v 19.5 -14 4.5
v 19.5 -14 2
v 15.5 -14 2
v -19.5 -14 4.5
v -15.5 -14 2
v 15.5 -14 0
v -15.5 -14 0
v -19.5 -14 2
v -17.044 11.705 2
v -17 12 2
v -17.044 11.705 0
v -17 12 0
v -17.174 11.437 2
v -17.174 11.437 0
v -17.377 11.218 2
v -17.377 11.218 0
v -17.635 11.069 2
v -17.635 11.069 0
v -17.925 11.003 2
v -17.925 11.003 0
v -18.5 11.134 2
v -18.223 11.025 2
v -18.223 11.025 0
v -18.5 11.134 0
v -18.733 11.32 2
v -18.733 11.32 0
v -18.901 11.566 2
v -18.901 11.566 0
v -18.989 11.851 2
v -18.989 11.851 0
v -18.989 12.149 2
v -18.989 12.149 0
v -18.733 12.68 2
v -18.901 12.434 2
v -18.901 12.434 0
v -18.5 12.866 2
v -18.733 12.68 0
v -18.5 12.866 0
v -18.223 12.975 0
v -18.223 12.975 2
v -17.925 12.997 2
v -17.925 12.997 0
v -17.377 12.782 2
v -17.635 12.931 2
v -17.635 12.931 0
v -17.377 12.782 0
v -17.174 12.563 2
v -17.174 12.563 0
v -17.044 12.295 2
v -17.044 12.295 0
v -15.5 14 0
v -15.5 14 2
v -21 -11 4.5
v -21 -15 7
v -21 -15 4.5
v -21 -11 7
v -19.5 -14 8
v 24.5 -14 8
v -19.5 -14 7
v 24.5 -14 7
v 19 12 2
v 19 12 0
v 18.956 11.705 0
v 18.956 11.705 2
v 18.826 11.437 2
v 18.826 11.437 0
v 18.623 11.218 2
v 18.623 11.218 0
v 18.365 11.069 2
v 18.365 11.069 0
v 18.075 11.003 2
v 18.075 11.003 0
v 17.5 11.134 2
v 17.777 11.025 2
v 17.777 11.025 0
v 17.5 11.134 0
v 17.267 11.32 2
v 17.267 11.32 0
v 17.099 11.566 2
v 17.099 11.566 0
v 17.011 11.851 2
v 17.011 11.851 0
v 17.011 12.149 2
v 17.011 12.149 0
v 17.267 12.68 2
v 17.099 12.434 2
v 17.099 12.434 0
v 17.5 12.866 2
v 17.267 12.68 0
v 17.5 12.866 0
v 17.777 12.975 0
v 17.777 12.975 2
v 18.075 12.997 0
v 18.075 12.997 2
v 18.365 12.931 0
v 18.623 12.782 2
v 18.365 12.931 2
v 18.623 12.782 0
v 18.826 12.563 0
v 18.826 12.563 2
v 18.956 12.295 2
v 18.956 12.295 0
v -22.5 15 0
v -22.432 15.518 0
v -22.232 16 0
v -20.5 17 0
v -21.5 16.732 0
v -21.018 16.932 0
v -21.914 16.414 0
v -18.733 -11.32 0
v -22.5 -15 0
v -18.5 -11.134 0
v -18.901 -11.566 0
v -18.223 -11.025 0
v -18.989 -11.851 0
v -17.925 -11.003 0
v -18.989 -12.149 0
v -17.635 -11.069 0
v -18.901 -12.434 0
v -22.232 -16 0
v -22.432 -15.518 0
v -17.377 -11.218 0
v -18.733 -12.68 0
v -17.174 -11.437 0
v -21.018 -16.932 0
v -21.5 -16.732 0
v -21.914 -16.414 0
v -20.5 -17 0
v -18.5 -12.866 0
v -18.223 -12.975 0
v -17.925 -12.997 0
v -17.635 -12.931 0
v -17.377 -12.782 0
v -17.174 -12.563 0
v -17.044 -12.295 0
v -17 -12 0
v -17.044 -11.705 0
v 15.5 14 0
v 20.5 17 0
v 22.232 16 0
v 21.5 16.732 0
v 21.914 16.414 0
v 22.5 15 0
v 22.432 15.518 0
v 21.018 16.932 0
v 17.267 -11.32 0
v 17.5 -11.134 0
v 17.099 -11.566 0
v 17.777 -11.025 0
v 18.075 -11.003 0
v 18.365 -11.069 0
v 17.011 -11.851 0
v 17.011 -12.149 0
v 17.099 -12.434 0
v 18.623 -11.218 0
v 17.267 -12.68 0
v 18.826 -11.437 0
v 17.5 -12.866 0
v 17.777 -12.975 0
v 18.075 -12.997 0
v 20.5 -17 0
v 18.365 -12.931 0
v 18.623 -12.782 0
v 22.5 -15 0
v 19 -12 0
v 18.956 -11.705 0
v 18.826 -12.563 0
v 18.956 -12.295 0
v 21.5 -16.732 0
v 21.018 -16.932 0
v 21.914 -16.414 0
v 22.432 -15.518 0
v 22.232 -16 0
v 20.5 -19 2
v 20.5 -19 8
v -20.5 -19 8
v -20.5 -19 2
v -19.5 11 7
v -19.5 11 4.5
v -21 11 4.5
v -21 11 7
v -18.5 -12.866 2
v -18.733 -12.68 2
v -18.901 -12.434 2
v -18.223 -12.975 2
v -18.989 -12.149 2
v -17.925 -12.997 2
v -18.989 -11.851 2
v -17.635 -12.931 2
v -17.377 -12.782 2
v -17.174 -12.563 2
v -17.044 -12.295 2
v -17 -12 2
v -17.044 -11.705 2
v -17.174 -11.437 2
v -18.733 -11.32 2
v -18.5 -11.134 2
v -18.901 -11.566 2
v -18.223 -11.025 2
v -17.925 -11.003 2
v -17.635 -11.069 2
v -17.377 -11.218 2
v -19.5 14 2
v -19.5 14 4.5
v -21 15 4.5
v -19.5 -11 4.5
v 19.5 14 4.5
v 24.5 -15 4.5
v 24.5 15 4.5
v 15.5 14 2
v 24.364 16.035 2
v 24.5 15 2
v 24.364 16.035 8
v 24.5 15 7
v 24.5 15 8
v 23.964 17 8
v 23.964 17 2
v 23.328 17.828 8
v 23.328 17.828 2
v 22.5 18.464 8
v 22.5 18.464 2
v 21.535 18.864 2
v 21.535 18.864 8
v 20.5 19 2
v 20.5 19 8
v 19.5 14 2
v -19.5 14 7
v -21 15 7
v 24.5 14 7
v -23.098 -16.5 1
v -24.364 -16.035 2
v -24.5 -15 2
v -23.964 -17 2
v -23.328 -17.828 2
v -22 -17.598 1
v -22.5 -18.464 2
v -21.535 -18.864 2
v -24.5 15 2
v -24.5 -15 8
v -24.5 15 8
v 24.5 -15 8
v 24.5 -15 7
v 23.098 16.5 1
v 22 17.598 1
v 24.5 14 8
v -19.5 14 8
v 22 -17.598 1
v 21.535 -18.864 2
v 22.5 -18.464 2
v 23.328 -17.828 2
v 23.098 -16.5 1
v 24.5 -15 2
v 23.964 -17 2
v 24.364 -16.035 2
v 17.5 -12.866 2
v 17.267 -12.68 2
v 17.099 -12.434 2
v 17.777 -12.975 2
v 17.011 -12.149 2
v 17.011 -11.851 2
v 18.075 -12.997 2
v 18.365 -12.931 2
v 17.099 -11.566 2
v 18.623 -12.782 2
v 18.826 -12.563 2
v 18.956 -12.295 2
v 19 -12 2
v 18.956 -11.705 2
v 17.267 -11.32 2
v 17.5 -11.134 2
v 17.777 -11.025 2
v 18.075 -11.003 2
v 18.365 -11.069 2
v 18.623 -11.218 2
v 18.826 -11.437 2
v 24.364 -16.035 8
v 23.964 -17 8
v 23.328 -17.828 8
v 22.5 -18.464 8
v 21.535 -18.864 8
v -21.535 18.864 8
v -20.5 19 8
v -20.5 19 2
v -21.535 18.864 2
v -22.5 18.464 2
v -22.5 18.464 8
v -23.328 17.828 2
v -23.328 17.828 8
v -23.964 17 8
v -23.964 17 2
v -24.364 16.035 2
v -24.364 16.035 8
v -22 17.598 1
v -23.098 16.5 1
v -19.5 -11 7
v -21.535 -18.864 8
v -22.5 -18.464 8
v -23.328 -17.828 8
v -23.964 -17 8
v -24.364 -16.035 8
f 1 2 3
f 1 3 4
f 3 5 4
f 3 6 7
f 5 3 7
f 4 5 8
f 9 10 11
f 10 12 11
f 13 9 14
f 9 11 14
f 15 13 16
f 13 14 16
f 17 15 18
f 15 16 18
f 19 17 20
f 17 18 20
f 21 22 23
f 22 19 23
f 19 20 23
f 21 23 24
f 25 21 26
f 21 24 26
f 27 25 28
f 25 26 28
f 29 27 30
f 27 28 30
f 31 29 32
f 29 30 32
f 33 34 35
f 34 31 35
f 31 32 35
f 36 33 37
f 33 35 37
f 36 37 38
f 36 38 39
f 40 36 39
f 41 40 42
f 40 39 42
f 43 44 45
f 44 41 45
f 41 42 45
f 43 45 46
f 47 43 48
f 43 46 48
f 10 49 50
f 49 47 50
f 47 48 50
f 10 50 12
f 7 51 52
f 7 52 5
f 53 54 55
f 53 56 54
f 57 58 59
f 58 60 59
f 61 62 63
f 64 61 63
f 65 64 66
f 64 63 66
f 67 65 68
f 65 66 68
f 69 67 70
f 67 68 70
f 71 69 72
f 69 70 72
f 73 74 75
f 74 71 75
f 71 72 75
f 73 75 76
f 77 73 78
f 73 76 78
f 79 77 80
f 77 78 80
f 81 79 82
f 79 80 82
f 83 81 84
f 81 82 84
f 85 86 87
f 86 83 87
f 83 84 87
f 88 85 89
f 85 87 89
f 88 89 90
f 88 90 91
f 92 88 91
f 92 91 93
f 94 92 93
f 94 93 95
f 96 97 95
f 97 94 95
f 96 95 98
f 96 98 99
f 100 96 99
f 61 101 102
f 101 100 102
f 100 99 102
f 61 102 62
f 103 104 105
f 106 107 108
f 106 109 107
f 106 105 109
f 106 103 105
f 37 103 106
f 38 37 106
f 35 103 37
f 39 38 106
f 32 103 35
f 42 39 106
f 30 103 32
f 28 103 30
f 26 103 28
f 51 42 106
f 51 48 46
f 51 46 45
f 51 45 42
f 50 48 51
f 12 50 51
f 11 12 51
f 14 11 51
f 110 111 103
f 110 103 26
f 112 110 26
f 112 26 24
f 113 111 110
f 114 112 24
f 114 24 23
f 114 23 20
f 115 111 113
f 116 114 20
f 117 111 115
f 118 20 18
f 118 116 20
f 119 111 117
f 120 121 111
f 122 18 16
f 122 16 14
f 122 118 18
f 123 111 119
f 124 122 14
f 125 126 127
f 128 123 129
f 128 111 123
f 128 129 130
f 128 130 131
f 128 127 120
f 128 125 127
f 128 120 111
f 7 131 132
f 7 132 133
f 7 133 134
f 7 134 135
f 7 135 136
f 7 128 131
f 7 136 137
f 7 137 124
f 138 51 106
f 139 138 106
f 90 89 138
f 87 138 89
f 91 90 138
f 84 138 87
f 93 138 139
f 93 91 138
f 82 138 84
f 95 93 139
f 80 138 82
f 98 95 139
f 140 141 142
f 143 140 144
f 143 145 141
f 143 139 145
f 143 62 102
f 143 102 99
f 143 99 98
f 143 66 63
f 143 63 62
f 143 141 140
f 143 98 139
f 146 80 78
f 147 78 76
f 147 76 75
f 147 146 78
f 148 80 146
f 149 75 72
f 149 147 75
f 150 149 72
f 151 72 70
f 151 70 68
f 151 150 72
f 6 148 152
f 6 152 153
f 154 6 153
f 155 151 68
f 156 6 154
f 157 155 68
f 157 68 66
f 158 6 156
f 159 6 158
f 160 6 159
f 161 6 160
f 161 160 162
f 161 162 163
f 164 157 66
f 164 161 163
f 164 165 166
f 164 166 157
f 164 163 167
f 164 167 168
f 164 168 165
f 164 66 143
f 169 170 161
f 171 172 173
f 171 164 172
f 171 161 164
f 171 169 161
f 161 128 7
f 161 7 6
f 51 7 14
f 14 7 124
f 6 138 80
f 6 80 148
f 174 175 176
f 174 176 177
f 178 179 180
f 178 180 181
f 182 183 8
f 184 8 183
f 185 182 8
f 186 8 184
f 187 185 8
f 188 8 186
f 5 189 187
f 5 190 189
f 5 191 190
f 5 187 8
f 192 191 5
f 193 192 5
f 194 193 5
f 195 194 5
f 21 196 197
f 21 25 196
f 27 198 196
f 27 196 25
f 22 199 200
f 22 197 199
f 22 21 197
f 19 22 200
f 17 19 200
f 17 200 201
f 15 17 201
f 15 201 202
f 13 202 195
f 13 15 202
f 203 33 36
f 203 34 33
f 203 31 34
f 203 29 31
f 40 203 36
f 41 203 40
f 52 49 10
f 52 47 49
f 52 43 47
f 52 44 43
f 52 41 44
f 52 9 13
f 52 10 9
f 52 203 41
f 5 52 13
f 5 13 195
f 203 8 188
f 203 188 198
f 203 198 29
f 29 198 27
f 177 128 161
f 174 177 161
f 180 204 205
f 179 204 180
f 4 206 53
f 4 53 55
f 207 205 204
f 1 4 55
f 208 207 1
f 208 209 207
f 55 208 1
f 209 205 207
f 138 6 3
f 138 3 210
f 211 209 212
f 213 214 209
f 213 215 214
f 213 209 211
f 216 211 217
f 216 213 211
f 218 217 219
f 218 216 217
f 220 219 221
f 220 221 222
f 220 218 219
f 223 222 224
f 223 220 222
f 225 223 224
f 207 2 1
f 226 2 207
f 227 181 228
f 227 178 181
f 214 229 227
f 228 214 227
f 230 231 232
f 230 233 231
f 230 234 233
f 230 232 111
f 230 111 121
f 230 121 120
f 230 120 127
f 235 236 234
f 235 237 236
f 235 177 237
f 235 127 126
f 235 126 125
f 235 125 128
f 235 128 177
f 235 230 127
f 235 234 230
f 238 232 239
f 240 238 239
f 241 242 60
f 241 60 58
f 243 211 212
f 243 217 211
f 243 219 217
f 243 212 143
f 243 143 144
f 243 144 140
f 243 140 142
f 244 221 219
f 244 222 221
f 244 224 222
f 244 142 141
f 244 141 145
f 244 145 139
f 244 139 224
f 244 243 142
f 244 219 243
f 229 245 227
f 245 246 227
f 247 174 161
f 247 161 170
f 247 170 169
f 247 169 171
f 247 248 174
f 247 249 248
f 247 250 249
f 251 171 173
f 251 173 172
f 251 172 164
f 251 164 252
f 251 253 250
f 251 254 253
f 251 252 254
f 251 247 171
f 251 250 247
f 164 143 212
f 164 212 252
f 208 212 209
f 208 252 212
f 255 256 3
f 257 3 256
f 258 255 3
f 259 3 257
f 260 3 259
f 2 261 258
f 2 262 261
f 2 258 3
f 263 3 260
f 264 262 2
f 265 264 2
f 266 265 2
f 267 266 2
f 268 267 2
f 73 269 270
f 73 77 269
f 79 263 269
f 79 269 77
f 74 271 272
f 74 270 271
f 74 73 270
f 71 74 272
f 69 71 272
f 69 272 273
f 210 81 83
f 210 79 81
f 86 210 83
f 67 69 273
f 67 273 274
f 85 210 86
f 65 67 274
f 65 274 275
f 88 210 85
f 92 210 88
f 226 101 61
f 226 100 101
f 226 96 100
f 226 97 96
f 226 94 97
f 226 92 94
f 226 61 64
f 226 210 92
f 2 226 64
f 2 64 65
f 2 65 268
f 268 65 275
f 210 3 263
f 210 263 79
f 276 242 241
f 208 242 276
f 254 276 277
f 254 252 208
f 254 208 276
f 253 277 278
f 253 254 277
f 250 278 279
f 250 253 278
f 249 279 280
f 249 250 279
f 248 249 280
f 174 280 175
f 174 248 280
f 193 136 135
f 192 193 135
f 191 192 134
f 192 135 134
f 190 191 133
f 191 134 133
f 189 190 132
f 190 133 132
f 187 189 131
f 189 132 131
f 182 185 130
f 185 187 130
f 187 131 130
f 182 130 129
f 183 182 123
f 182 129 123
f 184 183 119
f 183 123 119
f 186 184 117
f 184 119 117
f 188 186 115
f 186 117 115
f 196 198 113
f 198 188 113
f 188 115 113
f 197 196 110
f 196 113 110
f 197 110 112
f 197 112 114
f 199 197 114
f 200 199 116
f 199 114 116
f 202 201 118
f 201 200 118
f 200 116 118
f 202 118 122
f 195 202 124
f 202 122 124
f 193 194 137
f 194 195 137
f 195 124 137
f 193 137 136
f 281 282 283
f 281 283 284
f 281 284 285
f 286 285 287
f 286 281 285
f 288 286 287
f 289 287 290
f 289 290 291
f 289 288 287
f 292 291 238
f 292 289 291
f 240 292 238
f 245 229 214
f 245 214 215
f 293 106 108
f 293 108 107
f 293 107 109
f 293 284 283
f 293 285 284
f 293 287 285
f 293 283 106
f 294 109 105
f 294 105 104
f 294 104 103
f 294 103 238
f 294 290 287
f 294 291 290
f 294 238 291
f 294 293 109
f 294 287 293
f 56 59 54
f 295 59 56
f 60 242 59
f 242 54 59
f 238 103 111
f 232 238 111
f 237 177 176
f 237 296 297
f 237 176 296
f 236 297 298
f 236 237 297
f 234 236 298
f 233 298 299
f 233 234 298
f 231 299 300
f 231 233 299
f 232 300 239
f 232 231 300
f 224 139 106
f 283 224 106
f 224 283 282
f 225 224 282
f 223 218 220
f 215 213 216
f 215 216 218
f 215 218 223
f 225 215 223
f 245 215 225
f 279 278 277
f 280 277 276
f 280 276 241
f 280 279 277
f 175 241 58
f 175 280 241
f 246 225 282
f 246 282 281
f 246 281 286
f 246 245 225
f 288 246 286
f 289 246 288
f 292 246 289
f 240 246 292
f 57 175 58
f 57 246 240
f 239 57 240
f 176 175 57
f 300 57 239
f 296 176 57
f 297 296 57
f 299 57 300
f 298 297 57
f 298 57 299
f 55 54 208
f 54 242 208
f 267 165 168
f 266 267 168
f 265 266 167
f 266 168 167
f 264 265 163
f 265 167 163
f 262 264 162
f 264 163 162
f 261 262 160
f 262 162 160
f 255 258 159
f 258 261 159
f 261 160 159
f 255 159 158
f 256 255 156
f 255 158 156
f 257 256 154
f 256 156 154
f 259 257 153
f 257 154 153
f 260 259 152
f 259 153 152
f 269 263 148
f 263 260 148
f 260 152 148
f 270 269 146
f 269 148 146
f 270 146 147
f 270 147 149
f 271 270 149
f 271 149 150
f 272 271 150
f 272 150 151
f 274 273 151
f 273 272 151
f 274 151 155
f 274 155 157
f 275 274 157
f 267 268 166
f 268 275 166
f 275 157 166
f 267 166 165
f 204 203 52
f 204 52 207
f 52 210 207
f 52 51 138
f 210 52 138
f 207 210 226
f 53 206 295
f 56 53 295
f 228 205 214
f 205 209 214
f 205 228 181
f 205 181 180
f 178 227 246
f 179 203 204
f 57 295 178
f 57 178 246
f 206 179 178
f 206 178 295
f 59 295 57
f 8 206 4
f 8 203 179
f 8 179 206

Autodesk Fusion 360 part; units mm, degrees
sketch "Skizze1" plane through (0, 0, 0) normal (0, 0, 1) x (1, 0, 0)
  line L0 (19.5, 14) -> (-19.5, 14)
  line L1 (-19.5, 14) -> (-19.5, -14)
  line L2 (-19.5, -14) -> (19.5, -14)
  line L3 (19.5, -14) -> (19.5, 14)
  line L4 (19.5, 14) -> (-19.5, -14) construction
  line L5 (-19.5, 14) -> (19.5, -14) construction
  line L6 (22.5, 17) -> (-22.5, 17)
  line L7 (-22.5, 17) -> (-22.5, -17)
  line L8 (-22.5, -17) -> (22.5, -17)
  line L9 (22.5, -17) -> (22.5, 17)
  line L10 (22.5, 17) -> (-22.5, -17) construction
  line L11 (-22.5, 17) -> (22.5, -17) construction
  line L12 (15.5, 14) -> (-15.5, 14)
  line L13 (-15.5, 14) -> (-15.5, -14)
  line L14 (-15.5, -14) -> (15.5, -14)
  line L15 (15.5, -14) -> (15.5, 14)
  line L16 (15.5, 14) -> (-15.5, -14) construction
  line L17 (-15.5, 14) -> (15.5, -14) construction
  line L18 (-19.5, 14) -> (-18.5, 14)
  circle A0 centre (-18, 12) radius 1
  circle A1 centre (-18, -12) radius 1
  circle A2 centre (18, -12) radius 1
  circle A3 centre (18, 12) radius 1
  dimension "d1" = 39
  dimension "d2" = 28
  dimension "d3" = 45
  dimension "d4" = 34
  dimension "d5" = 31
  dimension "d7" = 2
  dimension "d8" = 2
  dimension "d9" = 2
  dimension "d10" = 2
extrude "Extrusion1" add sketch "Skizze1" along normal blind 6 contours L6 L7 L8 L9
extrude "Extrusion2" add sketch "Skizze1" along normal blind 2 contours L0 L2 L3 L15 | L0 L1 L2 L13 L18
extrude "Extrusion3" add 1 faces at (-6.5, -16, 6) along direction (0, 0, 1) blind 2
extrude "Extrusion4" add 1 faces at (-22.5, -5.6667, 5.3333) along direction (-1, 0, 0) blind 2
extrude "Extrusion5" add 1 faces at (22.5, -5.6667, 2.6667) along direction (1, 0, 0) blind 2
extrude "Extrusion6" add 1 faces at (-8.1667, -17, 5.3333) along direction (0, -1, 0) blind 2
extrude "Extrusion7" add 1 faces at (8.1667, 17, 5.3333) along direction (0, 1, 0) blind 2
fillet "Abrundung1" radius 4 1 edges at (24.5, 19, 4)
fillet "Abrundung2" radius 4 1 edges at (-24.5, 19, 4)
fillet "Abrundung3" radius 4 1 edges at (-24.5, -19, 4)
fillet "Abrundung4" radius 4 1 edges at (24.5, -19, 4)
chamfer "Fase1" distance 2 angle 45 8 edges at (24.5, 0, 0) (23.3284, -17.8284, 0) (0, -19, 0) (-23.3284, -17.8284, 0) (-24.5, 0, 0) (-23.3284, 17.8284, 0) (0, 19, 0) (23.3284, 17.8284, 0)
sketch "Skizze2" plane through (24.5, 0, 0) normal (1, 0, 0) x (0, 0, -1)
  line L0 (-2, -15) -> (-2, 15)
  line L1 (-2, 15) -> (-8, 15)
  line L2 (-8, 15) -> (-8, -15)
  line L3 (-8, -15) -> (-2, -15)
  line L4 (-7, 15) -> (-4.5, 15)
  line L5 (-4.5, 15) -> (-4.5, -15)
  line L6 (-4.5, -15) -> (-7, -15)
  line L7 (-7, -15) -> (-7, 15)
extrude "Extrusion8" cut sketch "Skizze2" against normal blind 44 contours L1 L3 L4 L5 L6 L7
sketch "Skizze3" plane through (0, 0, 0) normal (1, 0, 0) x (0, 0, -1)
  line L0 (-4.5, -14) -> (-2, -14)
  line L1 (-2, -14) -> (-2, 14)
  line L2 (-2, 14) -> (-4.5, 14)
  line L3 (-4.5, 14) -> (-4.5, 15)
  line L4 (-4.5, 15) -> (-7, 15)
  line L5 (-7, 15) -> (-7, 14)
  line L6 (-7, 14) -> (-8, 14)
  line L7 (-8, 14) -> (-8, -14)
  line L8 (-8, -14) -> (-7, -14)
  line L9 (-7, -14) -> (-7, -15)
  line L10 (-7, -15) -> (-4.5, -15)
  line L11 (-4.5, -15) -> (-4.5, -14)
  line L12 (-7, 15) -> (-4.5, 15)
  line L13 (-4.5, 15) -> (-4.5, 11)
  line L14 (-4.5, 11) -> (-7, 11)
  line L15 (-7, 11) -> (-7, 15)
  line L16 (-7, -15) -> (-4.5, -15)
  line L17 (-4.5, -15) -> (-4.5, -11)
  line L18 (-4.5, -11) -> (-7, -11)
  line L19 (-7, -11) -> (-7, -15)
  dimension "d37" = 4
  dimension "d38" = 2.5
  dimension "d39" = 4
  dimension "d40" = 2.5
extrude "Extrusion9" cut sketch "Skizze3" against normal blind 21 contours L9 L10 L11 L16 L17 L18 L19 | L3 L4 L5 L12 L13 L14 L15
sketch "Skizze4" plane through (19.5, 0, 0) normal (-1, 0, 0) x (0, 0, 1)
  line L0 (7, 14) -> (7, -14)
  line L1 (7, -14) -> (8, -14)
  line L2 (8, -14) -> (8, 14)
  line L3 (8, 14) -> (7, 14)
  line L4 (7, 14) -> (8, 14)
  line L5 (8, 14) -> (8, -14)
  line L6 (8, -14) -> (7, -14)
  line L7 (7, -14) -> (7, 14)
extrude "Extrusion10" cut sketch "Skizze4" against normal blind 5
